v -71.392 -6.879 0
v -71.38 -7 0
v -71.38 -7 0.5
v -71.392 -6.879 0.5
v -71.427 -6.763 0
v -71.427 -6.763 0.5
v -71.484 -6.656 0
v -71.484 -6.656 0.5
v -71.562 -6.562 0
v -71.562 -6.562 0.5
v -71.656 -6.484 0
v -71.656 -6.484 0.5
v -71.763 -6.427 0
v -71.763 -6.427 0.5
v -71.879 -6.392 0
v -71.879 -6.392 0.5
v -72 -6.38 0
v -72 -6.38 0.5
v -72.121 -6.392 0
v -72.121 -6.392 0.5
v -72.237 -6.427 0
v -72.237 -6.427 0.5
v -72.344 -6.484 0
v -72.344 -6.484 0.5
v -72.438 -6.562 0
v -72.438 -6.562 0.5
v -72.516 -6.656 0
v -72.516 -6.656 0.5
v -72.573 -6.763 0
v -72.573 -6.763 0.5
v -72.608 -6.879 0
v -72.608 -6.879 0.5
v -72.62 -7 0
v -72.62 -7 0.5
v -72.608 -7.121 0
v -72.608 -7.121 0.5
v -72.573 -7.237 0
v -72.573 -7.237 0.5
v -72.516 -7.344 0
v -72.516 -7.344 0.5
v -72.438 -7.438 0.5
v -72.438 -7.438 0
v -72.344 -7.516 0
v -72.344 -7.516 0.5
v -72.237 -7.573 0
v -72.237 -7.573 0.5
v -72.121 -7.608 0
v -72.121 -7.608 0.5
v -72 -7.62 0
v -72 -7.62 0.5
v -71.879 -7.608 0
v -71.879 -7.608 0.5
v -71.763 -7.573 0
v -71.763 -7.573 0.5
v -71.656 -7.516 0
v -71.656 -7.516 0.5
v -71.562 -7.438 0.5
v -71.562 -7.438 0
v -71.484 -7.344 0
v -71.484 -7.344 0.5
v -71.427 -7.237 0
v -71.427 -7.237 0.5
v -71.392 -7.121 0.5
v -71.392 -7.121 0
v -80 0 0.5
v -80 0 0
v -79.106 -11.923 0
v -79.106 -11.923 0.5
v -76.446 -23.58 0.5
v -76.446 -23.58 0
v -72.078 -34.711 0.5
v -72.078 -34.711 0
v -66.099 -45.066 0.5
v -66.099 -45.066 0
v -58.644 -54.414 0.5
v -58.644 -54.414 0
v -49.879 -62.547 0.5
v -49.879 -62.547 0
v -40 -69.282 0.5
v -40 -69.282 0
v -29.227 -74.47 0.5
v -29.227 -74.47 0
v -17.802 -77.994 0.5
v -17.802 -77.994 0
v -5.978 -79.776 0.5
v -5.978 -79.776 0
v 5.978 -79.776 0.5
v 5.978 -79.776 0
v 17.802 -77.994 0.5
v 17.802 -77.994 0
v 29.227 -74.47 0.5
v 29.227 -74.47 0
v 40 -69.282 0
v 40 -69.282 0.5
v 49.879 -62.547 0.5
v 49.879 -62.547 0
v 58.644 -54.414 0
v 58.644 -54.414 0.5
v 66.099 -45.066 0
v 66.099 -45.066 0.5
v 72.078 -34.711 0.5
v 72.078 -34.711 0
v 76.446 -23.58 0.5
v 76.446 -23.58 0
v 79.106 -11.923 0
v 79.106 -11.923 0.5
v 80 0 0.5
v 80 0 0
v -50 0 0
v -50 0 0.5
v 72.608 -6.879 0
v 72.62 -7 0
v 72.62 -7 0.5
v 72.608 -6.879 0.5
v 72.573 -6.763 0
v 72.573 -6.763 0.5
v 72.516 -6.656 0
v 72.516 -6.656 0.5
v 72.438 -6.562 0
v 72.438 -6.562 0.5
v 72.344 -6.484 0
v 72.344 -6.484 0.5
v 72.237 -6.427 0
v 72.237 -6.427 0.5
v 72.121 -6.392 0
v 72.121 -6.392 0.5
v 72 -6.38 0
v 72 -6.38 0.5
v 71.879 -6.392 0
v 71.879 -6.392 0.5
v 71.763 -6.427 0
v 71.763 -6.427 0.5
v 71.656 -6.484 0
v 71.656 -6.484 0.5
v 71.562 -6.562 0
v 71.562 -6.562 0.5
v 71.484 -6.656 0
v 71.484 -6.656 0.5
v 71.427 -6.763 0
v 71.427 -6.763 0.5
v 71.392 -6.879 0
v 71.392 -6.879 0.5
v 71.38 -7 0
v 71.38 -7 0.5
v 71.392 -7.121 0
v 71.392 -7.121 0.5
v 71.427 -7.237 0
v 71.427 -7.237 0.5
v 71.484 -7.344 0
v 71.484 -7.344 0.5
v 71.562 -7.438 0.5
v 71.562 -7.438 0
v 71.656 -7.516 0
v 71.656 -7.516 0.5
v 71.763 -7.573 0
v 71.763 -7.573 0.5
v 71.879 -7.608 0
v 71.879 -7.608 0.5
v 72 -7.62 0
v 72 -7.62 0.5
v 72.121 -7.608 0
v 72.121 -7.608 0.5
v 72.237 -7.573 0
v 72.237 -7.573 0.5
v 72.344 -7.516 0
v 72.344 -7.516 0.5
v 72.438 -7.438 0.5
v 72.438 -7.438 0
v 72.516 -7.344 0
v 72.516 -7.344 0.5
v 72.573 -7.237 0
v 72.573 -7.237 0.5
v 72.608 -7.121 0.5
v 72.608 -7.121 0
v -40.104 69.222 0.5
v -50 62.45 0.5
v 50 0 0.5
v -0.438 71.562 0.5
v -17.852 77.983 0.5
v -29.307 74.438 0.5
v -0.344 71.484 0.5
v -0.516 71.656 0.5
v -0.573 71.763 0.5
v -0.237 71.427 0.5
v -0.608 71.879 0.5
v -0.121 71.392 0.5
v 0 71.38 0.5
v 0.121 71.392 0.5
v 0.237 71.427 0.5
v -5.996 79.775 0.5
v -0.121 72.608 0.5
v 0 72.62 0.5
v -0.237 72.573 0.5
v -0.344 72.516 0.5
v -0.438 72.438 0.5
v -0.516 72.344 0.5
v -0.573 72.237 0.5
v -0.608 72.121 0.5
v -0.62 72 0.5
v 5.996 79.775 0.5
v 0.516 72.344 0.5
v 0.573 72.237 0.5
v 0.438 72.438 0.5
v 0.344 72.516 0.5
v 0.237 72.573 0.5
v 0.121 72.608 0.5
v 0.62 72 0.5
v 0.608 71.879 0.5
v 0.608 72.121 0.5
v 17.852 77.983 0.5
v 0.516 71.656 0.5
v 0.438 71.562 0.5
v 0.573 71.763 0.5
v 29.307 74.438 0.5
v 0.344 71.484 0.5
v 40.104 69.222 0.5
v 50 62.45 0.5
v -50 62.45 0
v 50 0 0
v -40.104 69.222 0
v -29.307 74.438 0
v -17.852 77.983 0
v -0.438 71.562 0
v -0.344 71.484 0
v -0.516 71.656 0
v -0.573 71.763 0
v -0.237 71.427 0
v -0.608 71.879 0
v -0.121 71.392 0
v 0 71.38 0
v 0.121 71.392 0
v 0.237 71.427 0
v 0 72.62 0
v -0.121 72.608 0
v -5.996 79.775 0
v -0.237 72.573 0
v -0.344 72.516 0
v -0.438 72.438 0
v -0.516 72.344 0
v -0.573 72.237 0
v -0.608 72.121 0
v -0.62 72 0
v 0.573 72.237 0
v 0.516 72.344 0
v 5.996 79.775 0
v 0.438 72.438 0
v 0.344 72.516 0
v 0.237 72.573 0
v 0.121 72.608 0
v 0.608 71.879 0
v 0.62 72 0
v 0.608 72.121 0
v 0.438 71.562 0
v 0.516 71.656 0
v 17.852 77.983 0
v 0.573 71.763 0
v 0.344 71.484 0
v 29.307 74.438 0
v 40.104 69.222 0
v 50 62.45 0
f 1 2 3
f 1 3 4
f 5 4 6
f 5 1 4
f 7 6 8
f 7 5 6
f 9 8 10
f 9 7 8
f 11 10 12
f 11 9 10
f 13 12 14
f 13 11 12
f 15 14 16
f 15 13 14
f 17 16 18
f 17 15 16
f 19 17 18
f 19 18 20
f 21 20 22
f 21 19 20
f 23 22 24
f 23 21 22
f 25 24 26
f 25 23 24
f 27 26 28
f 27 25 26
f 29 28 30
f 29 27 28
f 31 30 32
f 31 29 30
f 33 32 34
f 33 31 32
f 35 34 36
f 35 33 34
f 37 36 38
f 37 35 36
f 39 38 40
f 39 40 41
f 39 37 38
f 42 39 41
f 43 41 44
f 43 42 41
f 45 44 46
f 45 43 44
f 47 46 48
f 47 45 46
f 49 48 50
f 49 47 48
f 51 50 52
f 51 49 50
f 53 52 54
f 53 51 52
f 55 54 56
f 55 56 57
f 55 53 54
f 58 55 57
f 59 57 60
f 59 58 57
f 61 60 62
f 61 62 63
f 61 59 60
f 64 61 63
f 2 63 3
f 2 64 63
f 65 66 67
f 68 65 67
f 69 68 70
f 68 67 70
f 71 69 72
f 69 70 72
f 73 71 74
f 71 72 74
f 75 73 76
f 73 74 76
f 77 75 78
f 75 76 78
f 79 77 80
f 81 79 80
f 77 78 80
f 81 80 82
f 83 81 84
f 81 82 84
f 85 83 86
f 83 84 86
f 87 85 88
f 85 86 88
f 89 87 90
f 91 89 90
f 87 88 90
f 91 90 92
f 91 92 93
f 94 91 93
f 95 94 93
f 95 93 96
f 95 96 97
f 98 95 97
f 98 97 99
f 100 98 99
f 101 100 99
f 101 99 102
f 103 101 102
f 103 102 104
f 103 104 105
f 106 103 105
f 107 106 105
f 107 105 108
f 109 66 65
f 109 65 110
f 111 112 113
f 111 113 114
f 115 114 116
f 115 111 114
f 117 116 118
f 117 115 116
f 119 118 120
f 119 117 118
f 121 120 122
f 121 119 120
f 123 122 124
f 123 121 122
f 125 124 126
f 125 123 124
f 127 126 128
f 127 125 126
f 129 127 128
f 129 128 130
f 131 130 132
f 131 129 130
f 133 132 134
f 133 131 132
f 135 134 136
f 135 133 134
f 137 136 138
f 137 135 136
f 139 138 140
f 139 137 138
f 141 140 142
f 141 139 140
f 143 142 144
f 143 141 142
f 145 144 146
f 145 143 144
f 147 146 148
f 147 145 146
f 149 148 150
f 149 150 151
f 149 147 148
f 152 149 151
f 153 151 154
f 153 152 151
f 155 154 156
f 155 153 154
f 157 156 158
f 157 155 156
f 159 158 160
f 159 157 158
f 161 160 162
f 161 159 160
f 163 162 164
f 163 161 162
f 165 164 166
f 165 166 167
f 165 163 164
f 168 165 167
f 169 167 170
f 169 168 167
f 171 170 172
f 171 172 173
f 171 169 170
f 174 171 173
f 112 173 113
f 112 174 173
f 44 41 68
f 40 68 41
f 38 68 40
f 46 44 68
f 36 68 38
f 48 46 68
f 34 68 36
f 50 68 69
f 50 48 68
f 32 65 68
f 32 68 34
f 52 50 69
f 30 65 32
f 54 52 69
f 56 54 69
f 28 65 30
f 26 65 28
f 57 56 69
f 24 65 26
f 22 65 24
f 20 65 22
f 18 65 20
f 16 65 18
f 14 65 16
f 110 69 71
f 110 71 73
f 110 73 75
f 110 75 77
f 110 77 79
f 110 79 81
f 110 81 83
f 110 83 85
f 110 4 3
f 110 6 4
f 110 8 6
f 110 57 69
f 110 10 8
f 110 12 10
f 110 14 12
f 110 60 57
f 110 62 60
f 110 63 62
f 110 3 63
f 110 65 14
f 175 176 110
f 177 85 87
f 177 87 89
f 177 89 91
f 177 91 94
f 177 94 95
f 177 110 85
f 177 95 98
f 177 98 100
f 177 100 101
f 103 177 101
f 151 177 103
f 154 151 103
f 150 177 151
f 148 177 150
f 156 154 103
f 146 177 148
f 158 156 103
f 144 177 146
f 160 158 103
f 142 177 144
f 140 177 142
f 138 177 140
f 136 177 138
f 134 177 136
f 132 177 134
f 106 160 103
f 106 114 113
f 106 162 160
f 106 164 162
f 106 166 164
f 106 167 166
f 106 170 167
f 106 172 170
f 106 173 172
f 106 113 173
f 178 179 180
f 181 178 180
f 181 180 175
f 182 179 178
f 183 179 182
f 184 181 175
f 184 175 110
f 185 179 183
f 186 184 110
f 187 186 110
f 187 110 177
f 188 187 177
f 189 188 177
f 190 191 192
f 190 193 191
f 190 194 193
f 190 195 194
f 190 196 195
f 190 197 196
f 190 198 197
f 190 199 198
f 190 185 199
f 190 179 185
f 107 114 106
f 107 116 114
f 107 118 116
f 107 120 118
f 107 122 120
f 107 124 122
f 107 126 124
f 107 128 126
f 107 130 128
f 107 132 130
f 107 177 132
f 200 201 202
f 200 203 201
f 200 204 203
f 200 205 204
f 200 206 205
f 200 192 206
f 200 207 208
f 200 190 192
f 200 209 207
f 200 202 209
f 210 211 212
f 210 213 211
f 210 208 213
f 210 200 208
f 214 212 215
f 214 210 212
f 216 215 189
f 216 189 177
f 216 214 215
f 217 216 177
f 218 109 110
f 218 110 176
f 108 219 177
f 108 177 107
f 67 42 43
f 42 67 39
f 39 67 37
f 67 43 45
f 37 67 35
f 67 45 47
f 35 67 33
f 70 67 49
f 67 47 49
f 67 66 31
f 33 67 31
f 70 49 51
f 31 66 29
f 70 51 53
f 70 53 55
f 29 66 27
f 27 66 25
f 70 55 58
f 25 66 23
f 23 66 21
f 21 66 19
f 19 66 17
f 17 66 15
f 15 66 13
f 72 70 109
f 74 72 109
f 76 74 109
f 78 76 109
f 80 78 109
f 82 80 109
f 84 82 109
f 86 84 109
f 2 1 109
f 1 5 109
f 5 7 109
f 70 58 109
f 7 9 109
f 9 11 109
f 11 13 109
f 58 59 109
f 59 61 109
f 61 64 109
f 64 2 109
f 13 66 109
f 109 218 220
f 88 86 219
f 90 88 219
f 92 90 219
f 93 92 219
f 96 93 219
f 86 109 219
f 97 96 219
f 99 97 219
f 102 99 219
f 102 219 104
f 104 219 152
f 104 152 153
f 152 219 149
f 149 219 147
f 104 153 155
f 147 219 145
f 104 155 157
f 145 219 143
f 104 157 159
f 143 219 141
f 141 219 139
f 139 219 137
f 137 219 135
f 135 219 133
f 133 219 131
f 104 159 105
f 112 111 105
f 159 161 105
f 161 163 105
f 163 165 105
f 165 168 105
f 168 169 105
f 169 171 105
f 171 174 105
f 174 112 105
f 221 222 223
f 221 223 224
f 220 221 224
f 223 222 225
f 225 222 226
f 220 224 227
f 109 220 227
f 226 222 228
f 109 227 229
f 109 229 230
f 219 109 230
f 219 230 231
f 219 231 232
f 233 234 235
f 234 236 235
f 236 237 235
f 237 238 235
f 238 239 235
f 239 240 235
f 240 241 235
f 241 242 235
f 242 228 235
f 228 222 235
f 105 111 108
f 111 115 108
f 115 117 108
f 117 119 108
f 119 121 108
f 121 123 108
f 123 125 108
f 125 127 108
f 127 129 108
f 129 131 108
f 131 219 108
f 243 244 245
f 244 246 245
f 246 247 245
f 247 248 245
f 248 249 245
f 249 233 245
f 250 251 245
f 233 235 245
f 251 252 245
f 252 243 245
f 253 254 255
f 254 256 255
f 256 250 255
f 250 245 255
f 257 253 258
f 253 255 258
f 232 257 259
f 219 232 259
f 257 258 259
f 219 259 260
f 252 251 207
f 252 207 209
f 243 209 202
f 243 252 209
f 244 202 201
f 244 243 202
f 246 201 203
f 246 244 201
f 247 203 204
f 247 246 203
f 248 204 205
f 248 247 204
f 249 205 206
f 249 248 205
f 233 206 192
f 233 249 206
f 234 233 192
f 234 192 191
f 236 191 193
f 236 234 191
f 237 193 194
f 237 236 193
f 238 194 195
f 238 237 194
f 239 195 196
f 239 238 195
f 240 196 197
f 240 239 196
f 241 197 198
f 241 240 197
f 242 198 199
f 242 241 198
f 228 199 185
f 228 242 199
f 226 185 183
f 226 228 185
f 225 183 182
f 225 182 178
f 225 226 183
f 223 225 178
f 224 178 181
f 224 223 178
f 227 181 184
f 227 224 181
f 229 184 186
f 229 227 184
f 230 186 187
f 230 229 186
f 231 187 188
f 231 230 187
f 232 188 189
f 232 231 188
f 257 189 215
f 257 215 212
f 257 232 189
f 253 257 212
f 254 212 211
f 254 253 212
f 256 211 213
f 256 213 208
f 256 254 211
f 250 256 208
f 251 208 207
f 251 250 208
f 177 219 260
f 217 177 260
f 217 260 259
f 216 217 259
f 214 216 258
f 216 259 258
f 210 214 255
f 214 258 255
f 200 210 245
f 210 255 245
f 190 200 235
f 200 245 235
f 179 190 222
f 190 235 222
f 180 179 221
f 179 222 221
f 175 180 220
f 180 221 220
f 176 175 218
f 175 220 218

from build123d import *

# Parameters (mm, degrees)
BOX_W             = 30
BOX_H             = 70
BOX_DEPTH         = 0.5
BOX001_W          = 30
BOX001_H          = 70
BOX001_DEPTH      = 0.5
CYLINDER004_R     = 0.62
CYLINDER004_DEPTH = 0.5
CYLINDER003_R     = 0.62
CYLINDER003_DEPTH = 0.5
CYLINDER001_R     = 0.62
CYLINDER001_DEPTH = 0.5
CYLINDER_R        = 80
CYLINDER_DEPTH    = 0.5


with BuildPart() as cubo:
    # Box → Box (new body)
    with BuildSketch(Plane(origin=(-80, 0, 0), x_dir=(1, 0, 0), z_dir=(0, 0, 1))):
        with Locations((15, 35)):
            Rectangle(BOX_W, BOX_H)
    extrude(amount=BOX_DEPTH)


with BuildPart() as cubo001:
    # Box001 → Box001 (new body)
    with BuildSketch(Plane(origin=(50, 0, 0), x_dir=(1, 0, 0), z_dir=(0, 0, 1))):
        with Locations((15, 35)):
            Rectangle(BOX001_W, BOX001_H)
    extrude(amount=BOX001_DEPTH)


with BuildPart() as perfo003:
    # Cylinder004 → Cylinder004 (new body)
    with BuildSketch(Plane(origin=(72, -7, 0), x_dir=(1, 0, 0), z_dir=(0, 0, 1))):
        Circle(CYLINDER004_R)
    extrude(amount=CYLINDER004_DEPTH)


with BuildPart() as perfo002:
    # Cylinder003 → Cylinder003 (new body)
    with BuildSketch(Plane(origin=(-72, -7, 0), x_dir=(1, 0, 0), z_dir=(0, 0, 1))):
        Circle(CYLINDER003_R)
    extrude(amount=CYLINDER003_DEPTH)


with BuildPart() as perfo:
    # Cylinder001 → Cylinder001 (new body)
    with BuildSketch(Plane(origin=(0, 72, 0), x_dir=(1, 0, 0), z_dir=(0, 0, 1))):
        Circle(CYLINDER001_R)
    extrude(amount=CYLINDER001_DEPTH)


with BuildPart() as cut004:
    # Cylinder → Cylinder (new body)
    with BuildSketch(Plane.XY):
        Circle(CYLINDER_R)
    extrude(amount=CYLINDER_DEPTH)

    # Cut: cut PERFO
    add(perfo.part, mode=Mode.SUBTRACT)

    # Cut001: cut PERFO002
    add(perfo002.part, mode=Mode.SUBTRACT)

    # Cut002: cut PERFO003
    add(perfo003.part, mode=Mode.SUBTRACT)

    # Cut003: cut Cubo001
    add(cubo001.part, mode=Mode.SUBTRACT)

    # Cut004: cut Cubo
    add(cubo.part, mode=Mode.SUBTRACT)


solid = cut004.part
